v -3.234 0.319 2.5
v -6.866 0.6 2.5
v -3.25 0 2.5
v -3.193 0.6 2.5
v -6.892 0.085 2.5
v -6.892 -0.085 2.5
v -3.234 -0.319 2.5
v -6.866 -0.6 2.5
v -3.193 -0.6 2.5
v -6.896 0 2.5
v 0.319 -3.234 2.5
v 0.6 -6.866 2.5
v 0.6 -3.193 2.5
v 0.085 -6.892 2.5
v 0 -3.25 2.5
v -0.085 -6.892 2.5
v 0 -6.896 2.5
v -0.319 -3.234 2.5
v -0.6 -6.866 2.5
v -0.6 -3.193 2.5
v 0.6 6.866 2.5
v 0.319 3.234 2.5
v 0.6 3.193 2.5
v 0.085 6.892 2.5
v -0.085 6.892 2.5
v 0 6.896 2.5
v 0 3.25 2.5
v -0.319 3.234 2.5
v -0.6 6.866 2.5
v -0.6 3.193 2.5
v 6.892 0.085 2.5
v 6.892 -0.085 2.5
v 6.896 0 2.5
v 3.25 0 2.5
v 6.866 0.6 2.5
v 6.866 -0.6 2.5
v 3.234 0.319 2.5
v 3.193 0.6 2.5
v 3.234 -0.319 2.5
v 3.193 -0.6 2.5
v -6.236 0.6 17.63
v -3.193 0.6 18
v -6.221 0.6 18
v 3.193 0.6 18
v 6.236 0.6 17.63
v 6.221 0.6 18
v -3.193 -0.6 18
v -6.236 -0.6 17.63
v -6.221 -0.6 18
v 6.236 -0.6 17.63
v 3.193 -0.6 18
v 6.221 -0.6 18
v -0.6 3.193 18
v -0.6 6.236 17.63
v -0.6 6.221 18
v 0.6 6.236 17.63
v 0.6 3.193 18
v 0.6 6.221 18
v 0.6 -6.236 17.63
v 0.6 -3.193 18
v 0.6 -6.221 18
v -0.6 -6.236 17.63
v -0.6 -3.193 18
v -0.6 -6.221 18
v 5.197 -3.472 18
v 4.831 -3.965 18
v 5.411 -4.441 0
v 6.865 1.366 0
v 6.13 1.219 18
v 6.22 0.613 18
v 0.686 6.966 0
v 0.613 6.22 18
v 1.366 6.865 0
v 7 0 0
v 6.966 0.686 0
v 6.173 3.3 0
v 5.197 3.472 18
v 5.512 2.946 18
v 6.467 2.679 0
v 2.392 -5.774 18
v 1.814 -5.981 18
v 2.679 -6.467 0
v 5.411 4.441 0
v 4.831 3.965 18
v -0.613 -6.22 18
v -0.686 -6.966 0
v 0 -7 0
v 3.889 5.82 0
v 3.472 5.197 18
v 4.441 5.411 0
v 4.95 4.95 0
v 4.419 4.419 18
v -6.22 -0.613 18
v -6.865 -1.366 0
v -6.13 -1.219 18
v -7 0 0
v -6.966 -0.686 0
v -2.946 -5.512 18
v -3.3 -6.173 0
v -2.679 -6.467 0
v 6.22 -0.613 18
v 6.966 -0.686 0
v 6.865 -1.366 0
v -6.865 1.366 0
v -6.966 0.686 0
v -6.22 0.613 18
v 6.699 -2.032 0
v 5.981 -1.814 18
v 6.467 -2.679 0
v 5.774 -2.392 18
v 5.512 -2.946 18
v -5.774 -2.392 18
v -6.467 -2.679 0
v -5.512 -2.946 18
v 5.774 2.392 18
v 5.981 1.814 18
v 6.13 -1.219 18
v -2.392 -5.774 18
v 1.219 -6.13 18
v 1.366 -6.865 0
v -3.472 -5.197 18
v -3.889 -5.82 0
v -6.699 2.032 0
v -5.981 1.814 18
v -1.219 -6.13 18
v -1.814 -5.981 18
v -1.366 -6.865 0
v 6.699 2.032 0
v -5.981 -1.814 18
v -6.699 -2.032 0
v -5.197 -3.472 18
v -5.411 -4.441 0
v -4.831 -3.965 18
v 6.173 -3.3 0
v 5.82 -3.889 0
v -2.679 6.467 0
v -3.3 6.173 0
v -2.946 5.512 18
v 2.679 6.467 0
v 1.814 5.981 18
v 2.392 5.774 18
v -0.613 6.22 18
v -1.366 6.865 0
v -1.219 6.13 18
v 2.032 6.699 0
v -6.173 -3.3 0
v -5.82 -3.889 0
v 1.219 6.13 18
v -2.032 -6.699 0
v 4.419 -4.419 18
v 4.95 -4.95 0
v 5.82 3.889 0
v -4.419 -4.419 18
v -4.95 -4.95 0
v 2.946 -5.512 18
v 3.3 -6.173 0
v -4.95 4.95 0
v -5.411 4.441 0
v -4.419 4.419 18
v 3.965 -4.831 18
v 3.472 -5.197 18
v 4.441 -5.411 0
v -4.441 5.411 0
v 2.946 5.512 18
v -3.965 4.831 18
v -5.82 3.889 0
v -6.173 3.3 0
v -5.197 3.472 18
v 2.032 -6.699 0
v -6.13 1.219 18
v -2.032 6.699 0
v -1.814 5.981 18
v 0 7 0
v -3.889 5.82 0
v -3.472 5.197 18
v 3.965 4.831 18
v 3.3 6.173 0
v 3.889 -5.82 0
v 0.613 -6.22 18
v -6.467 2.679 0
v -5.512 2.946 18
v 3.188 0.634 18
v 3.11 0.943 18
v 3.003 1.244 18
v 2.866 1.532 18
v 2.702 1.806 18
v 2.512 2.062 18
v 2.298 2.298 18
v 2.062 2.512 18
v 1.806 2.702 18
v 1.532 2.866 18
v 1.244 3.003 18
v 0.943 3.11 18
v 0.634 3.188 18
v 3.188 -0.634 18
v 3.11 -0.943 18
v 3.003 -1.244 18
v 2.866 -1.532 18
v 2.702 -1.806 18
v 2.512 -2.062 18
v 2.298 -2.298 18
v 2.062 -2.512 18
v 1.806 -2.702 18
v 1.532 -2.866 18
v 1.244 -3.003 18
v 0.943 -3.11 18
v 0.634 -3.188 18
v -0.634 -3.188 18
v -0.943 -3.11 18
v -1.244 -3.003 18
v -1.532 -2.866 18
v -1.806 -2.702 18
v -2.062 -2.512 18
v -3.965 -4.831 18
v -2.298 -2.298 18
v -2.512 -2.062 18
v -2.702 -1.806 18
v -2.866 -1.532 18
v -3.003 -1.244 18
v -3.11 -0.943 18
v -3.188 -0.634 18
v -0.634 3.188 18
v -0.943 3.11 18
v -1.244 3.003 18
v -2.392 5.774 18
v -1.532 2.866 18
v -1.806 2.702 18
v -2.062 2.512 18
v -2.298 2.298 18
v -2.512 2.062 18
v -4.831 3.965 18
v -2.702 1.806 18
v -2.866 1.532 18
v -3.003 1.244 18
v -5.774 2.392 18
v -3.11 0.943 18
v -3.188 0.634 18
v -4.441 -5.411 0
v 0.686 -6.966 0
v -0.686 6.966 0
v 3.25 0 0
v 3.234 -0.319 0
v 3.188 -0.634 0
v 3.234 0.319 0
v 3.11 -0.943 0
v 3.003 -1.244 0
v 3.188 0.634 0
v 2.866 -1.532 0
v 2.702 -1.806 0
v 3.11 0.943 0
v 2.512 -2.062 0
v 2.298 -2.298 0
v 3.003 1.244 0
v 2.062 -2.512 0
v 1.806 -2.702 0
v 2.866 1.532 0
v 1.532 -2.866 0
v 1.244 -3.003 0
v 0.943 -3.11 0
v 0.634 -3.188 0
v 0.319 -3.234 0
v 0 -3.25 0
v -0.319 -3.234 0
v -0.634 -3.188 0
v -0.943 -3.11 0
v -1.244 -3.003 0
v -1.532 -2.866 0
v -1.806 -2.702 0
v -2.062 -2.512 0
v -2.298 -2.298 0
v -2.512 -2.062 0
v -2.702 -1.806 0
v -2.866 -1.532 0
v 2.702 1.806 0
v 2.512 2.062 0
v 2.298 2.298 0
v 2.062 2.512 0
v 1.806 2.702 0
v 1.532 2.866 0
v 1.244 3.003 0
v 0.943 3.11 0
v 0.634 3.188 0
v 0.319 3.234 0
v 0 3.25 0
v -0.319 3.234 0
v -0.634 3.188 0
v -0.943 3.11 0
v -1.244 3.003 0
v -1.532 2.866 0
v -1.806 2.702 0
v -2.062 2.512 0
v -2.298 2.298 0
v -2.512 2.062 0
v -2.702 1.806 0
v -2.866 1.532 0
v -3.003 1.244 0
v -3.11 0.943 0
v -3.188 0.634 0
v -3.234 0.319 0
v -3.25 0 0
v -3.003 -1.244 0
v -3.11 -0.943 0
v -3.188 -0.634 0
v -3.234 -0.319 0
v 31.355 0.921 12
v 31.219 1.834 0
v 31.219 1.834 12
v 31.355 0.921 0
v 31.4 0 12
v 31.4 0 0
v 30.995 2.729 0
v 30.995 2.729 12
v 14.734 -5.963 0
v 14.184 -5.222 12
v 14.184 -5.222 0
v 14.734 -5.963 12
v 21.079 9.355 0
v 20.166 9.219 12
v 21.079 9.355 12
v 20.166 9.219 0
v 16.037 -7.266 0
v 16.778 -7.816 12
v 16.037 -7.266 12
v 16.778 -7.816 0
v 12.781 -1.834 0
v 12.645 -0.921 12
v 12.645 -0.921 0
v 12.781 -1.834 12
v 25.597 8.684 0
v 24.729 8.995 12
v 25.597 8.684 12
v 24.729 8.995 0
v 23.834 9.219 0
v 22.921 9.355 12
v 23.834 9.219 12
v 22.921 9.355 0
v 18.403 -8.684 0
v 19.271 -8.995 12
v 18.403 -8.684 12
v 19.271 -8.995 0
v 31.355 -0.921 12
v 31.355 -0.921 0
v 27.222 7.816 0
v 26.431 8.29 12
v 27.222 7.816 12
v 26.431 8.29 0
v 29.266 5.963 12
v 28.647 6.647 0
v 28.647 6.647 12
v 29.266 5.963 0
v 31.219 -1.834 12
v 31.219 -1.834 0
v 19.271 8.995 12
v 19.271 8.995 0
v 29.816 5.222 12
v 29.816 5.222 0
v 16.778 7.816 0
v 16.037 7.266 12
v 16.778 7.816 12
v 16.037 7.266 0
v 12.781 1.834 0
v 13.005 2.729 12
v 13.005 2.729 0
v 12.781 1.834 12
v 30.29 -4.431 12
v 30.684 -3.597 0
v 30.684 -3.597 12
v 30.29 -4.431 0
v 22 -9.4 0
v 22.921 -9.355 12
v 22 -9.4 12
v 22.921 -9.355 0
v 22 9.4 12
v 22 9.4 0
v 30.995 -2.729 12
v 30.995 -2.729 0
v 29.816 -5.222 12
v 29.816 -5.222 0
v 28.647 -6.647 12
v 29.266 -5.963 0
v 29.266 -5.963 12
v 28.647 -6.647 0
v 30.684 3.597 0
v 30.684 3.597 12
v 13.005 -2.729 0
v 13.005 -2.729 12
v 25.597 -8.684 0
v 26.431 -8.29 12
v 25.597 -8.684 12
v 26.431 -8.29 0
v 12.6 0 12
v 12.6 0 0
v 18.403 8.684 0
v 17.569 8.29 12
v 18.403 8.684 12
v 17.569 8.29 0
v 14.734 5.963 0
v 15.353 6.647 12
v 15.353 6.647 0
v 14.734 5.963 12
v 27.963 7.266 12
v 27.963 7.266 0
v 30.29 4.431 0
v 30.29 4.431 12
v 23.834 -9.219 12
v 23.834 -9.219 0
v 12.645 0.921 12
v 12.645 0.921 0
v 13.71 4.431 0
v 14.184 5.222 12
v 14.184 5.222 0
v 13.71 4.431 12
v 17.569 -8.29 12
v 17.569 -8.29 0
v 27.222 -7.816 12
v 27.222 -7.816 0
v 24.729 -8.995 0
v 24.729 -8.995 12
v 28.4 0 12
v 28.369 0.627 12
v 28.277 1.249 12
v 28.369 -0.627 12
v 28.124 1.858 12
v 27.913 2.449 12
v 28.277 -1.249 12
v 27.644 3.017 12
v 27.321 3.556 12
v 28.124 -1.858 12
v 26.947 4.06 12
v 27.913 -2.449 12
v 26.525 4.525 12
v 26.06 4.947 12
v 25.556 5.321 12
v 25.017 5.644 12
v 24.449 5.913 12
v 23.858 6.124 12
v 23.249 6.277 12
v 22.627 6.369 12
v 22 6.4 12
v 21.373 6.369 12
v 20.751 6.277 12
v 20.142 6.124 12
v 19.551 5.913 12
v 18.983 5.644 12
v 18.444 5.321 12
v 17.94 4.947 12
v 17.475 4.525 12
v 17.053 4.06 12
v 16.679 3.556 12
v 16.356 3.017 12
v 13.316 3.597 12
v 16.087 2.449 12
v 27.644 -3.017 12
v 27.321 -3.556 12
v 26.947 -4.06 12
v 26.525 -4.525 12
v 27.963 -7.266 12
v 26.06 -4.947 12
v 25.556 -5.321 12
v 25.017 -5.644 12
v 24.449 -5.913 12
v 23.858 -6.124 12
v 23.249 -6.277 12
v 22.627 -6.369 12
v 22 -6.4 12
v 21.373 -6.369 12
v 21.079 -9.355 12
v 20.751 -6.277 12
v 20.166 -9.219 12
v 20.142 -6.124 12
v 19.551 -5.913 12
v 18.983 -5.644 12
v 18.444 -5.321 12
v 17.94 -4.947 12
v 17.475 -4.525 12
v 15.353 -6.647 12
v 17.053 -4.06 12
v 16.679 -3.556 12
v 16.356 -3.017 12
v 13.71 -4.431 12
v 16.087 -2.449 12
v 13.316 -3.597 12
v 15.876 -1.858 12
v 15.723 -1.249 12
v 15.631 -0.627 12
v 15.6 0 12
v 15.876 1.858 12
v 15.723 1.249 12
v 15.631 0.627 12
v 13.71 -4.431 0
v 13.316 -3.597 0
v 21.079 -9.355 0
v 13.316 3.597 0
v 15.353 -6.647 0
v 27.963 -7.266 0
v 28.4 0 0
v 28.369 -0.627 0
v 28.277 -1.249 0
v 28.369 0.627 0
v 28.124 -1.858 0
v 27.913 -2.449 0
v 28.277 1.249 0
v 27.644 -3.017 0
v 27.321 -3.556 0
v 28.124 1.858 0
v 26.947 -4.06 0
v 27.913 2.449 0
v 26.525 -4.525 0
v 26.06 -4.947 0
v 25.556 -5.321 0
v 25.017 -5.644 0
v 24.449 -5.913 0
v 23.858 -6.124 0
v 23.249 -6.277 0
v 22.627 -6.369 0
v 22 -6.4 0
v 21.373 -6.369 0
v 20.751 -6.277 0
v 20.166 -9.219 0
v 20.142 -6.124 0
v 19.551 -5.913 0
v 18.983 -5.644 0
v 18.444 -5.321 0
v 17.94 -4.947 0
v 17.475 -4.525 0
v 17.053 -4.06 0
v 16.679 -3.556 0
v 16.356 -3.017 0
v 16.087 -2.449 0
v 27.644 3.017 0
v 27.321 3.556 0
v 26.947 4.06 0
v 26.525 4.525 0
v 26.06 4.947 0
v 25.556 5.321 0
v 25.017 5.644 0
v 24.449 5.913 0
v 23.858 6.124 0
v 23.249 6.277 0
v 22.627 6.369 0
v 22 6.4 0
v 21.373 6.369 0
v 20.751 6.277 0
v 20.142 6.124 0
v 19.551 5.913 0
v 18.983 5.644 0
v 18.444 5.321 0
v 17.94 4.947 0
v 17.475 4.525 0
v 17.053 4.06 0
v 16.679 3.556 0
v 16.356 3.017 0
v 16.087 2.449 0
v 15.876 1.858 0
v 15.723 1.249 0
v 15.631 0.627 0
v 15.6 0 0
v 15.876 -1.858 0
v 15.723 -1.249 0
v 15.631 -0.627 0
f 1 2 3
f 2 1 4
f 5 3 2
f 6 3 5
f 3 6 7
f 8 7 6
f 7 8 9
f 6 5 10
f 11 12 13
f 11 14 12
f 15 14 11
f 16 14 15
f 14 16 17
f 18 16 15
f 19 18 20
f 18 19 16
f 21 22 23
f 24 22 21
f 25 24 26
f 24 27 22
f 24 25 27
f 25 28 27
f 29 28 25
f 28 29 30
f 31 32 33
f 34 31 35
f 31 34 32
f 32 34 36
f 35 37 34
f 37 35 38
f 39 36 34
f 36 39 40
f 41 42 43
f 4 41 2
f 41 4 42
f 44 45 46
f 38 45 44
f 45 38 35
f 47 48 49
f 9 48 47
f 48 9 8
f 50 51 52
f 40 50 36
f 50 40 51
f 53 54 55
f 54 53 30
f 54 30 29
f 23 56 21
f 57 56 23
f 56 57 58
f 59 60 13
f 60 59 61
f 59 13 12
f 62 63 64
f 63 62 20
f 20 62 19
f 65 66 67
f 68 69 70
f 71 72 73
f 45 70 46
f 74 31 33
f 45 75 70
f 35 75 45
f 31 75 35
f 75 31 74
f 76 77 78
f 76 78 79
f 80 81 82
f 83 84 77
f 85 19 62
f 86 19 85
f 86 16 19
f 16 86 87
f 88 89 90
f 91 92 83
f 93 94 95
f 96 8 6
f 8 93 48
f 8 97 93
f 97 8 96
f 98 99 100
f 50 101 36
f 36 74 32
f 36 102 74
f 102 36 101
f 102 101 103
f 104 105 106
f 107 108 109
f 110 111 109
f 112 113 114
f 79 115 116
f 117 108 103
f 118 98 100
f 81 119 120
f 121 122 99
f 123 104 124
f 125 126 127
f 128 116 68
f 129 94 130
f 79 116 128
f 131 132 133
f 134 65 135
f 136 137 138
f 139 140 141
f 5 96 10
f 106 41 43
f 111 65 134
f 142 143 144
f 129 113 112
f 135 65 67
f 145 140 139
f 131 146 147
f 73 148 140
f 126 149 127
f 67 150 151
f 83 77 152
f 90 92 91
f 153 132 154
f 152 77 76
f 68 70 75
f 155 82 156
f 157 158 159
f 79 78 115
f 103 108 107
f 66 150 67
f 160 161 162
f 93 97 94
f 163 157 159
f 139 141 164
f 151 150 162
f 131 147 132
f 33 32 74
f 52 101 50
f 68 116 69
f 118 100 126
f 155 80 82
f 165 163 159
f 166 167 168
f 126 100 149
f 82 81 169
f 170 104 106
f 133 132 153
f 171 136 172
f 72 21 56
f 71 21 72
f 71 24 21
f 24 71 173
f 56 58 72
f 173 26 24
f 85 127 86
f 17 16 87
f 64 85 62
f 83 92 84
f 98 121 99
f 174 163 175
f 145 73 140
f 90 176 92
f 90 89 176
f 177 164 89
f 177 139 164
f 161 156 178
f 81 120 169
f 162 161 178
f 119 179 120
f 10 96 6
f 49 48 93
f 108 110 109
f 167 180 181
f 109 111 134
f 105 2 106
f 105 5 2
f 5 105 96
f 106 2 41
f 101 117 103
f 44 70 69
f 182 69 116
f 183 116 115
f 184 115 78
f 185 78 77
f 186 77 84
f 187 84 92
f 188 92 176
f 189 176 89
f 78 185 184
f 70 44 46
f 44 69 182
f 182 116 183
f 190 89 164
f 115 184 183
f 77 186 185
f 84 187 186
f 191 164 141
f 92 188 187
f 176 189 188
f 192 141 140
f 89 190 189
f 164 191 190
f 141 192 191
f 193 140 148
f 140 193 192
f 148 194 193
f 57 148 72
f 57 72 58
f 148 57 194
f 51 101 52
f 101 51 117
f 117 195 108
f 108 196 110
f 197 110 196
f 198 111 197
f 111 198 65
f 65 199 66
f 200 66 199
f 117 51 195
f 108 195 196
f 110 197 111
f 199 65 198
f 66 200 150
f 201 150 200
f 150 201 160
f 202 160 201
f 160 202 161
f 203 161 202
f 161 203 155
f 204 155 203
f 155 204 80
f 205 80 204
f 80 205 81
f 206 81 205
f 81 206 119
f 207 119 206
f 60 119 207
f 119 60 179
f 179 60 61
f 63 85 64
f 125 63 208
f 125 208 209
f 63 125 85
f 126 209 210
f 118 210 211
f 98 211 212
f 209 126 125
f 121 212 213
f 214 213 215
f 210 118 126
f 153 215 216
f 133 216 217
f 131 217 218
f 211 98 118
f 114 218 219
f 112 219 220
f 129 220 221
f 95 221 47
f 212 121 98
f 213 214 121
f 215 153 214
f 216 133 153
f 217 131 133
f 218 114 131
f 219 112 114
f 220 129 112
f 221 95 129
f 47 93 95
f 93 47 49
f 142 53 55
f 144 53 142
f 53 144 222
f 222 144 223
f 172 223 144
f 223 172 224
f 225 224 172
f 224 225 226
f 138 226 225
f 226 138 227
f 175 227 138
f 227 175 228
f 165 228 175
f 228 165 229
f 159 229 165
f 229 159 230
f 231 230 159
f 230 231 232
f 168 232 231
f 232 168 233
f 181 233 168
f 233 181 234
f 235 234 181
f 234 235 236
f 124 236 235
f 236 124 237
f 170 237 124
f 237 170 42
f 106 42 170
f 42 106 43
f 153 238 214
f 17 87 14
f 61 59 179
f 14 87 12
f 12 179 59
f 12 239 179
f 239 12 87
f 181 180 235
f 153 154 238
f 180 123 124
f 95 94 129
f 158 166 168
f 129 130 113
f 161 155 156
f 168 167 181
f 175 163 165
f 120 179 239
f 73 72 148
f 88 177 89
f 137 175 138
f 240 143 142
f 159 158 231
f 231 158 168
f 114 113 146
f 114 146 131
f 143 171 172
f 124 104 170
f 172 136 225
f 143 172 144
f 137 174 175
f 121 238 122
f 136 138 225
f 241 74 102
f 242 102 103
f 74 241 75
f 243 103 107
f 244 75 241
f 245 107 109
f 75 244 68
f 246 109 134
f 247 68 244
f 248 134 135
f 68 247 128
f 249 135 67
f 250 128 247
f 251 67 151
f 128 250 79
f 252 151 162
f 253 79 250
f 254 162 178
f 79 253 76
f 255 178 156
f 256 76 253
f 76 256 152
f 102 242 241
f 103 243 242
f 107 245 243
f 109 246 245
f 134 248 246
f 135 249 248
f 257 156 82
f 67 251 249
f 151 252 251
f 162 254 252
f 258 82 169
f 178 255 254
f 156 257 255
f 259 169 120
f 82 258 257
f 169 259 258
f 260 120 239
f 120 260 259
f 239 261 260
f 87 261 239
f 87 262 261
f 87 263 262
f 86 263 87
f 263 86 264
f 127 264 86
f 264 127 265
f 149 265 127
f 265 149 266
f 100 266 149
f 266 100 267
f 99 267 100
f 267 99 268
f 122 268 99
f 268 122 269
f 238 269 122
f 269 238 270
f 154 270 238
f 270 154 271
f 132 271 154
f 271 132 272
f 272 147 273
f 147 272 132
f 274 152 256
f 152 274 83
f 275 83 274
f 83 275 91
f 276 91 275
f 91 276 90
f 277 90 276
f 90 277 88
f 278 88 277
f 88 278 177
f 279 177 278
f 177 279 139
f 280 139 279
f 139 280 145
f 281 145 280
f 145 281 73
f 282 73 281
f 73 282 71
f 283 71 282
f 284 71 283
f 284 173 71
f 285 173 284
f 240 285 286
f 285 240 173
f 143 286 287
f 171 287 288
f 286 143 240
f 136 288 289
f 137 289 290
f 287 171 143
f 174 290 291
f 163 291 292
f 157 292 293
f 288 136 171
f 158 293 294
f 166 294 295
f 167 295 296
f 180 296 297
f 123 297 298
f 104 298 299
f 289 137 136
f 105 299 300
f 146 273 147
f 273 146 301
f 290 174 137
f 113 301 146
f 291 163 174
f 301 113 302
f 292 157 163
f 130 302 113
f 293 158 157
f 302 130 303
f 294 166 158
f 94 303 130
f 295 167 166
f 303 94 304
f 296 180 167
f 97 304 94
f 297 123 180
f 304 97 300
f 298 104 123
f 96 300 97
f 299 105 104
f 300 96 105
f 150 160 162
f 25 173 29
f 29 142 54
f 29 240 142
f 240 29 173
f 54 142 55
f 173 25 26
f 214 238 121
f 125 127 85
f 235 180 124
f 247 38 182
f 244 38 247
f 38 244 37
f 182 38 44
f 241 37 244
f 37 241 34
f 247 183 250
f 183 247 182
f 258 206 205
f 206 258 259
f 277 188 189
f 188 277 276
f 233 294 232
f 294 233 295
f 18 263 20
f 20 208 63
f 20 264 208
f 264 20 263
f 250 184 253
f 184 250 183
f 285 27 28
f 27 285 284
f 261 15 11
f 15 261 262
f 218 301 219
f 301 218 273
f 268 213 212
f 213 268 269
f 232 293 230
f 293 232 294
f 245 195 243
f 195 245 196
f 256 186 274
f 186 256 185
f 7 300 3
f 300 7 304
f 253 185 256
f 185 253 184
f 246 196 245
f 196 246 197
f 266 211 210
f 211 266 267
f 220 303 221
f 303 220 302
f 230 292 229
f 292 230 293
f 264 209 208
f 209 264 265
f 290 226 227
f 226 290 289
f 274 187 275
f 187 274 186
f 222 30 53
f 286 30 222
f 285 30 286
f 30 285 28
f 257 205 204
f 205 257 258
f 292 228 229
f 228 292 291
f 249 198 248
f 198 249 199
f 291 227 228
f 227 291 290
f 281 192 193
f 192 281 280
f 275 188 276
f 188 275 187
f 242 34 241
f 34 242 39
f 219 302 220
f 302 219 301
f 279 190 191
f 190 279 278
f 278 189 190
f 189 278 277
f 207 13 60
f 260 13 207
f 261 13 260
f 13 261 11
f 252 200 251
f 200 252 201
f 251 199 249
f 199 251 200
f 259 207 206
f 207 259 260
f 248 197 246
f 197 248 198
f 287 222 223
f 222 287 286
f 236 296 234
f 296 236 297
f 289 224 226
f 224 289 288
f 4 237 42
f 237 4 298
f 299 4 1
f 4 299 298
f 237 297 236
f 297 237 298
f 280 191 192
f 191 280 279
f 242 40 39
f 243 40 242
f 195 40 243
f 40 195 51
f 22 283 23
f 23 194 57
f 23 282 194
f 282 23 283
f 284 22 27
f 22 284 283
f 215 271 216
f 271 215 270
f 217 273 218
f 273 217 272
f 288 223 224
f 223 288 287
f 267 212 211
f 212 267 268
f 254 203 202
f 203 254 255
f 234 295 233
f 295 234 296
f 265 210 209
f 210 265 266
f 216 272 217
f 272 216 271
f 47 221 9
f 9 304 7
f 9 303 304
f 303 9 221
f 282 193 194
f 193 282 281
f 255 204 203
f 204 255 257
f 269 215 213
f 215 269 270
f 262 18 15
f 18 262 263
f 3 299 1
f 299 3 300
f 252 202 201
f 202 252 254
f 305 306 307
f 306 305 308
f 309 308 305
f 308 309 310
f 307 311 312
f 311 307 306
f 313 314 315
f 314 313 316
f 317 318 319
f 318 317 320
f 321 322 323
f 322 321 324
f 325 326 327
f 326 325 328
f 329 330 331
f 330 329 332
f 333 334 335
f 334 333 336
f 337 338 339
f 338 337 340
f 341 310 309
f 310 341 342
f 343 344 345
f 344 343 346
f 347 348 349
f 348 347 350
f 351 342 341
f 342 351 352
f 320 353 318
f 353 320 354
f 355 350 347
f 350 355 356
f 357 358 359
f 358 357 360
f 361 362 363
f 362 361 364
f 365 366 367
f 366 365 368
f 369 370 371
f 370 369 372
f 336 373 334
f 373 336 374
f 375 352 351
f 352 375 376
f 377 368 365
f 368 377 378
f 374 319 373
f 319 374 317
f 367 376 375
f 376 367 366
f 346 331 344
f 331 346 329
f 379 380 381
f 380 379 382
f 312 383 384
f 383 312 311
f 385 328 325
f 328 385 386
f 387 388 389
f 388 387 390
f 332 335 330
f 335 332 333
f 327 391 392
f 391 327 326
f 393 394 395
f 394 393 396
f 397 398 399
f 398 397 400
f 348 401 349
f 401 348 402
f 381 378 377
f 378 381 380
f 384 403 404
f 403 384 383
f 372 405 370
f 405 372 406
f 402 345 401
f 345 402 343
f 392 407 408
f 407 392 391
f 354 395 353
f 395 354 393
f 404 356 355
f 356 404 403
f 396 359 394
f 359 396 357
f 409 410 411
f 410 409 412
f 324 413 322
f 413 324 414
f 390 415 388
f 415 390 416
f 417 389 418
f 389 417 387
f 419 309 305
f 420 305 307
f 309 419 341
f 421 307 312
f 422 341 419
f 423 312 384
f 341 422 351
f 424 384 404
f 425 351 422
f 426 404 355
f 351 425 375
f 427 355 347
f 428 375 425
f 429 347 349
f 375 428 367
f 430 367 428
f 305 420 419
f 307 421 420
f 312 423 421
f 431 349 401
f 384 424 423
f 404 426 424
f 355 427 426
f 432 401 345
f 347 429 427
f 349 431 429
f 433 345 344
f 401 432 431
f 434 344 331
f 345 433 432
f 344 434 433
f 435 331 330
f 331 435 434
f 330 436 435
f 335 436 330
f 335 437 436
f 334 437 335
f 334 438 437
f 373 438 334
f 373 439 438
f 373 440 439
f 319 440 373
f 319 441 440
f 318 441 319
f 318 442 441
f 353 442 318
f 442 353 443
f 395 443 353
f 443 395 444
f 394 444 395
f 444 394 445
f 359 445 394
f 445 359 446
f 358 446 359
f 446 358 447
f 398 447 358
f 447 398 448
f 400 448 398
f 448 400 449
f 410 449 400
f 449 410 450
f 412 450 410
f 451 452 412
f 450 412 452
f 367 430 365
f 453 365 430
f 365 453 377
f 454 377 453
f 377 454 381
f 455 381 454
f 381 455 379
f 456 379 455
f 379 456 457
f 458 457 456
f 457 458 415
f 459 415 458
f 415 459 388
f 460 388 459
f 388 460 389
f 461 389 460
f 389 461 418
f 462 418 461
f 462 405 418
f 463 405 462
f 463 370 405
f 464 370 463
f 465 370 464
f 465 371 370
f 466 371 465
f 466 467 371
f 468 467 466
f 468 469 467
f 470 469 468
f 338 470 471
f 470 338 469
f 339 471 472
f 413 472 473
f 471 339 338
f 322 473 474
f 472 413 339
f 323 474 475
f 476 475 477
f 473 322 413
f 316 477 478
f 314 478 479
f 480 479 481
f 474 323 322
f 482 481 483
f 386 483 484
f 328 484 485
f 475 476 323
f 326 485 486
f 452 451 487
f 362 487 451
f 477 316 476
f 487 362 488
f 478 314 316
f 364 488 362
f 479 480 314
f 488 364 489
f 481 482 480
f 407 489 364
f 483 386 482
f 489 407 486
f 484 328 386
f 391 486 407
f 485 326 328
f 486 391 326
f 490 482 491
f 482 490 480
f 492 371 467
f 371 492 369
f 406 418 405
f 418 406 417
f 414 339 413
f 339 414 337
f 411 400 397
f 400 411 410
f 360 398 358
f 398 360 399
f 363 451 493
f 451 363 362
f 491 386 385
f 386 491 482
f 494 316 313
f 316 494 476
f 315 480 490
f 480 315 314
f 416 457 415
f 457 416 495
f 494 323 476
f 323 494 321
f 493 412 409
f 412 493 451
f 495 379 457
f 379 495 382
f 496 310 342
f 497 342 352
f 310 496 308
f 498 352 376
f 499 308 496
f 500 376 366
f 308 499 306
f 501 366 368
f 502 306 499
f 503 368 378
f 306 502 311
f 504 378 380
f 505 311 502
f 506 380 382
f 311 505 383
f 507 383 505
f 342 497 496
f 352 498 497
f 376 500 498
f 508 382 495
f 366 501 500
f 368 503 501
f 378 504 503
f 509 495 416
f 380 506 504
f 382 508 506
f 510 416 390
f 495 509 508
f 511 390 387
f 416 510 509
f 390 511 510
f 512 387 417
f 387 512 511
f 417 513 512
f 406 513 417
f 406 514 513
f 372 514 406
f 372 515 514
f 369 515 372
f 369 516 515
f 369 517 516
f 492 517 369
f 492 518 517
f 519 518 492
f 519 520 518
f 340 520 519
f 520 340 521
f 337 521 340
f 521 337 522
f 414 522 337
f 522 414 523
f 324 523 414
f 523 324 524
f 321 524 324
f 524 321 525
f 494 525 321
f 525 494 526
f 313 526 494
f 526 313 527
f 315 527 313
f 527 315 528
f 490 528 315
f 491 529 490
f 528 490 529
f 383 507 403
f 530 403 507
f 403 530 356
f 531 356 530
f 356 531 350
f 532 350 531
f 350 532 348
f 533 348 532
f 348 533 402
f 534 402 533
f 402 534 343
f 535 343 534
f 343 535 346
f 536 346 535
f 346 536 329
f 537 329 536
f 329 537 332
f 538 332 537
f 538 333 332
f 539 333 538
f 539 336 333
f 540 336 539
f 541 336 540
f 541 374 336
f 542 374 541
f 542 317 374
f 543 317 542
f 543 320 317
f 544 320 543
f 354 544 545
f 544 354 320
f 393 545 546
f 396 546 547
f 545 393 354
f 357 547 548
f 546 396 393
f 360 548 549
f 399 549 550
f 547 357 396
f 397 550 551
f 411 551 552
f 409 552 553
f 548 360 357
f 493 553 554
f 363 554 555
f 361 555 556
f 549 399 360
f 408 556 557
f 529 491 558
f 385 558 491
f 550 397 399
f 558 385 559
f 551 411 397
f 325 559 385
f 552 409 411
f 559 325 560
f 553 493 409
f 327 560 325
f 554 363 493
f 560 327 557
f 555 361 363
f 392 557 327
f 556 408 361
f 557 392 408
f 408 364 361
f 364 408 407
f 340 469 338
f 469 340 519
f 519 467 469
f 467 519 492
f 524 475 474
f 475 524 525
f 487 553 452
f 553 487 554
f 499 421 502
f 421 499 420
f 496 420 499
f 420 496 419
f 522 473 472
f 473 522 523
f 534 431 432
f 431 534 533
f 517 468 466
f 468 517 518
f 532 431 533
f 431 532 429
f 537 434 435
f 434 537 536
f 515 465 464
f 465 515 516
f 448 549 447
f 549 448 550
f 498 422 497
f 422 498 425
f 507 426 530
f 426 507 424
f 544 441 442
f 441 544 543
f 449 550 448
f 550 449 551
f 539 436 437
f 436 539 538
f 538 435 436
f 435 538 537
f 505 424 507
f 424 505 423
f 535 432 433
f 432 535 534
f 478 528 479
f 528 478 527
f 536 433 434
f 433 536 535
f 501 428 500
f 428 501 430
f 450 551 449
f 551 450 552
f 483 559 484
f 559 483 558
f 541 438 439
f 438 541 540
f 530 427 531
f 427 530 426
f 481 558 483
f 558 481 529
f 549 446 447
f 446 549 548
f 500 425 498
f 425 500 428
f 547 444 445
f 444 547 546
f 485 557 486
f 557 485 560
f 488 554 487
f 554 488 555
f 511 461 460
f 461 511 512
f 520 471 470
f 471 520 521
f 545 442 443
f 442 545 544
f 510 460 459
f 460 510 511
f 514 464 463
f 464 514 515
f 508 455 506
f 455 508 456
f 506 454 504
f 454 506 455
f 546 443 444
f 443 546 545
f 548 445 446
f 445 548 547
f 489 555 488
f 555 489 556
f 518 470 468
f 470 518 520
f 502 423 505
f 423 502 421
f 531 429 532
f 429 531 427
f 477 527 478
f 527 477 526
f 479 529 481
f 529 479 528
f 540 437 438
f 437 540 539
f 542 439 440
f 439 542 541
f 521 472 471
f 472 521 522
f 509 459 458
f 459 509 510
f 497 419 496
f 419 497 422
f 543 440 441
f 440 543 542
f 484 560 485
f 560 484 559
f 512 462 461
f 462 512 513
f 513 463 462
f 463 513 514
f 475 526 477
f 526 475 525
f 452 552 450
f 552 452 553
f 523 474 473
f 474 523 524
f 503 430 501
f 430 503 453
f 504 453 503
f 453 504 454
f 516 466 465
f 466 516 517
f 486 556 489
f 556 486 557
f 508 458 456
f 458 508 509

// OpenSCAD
// Siphon strainer -- 1/4" tubing adapter (split collet + collar)
// Printed as a standalone pair; the sphere filter is combined later.
//
// Two fixes over the original geometry:
//   1. base_ring: slot cuts stop 2.5 mm short of the base, so the collet is one
//      part instead of four loose quarter-shells.
//   2. collar_id = clamp_od + collar_gap. The original clamp_od - 0.5 was
//      smaller than the collet's small end and could not be fitted at all.
//
// GRIP is set by the two numbers below. tube_bore controls how much the
// fingers must close to reach the tubing; collar_gap controls how hard the
// collar wedges them. Printed bores come out undersize by ~0.1-0.2 mm, so
// this is guess-and-check.

$fn = 64;

// ---- grip class (these are the knobs) ----
tube_bore  = 6.50;   // nominal tubing OD is 6.35
collar_gap = 0.30;   // collar_id = clamp_od + this

// Tubing
tube_od = 6.35;

// Collet
clamp_length = 18;
wall = 3;
slot_width = 1.2;
num_slots = 4;
taper = 1.5;
base_ring = 2.5;

// Collar
collar_length = 12;

// Derived
clamp_od  = tube_bore + 2*wall;
collar_id = clamp_od + collar_gap;
collar_od = collar_id + 2*wall;

// squeeze available at the base-ring stop, and the gap the fingers must close
gap_to_tube = (tube_bore - tube_od)/2;
squeeze_max = (taper*(1-base_ring/clamp_length) - collar_gap)/2;

echo(str("GRIP: bore=", tube_bore, " gap_to_tube=", gap_to_tube,
         " | collar_id=", collar_id, " squeeze_max=", squeeze_max));

module collet() {
    difference() {
        cylinder(h=clamp_length, d1=clamp_od+taper, d2=clamp_od);

        translate([0,0,-0.1])
            cylinder(h=clamp_length+0.2, d=tube_bore);

        for (a=[0:360/num_slots:359]) {
            rotate([0,0,a])
                translate([0,-slot_width/2,base_ring])
                    cube([clamp_od+taper, slot_width, clamp_length-base_ring+0.1]);
        }
    }
}

module collar() {
    difference() {
        cylinder(h=collar_length, d=collar_od);
        translate([0,0,-0.1])
            cylinder(h=collar_length+0.2, d=collar_id);
    }
}

// Both parts on one build plate
collet();
translate([22,0,0]) collar();
